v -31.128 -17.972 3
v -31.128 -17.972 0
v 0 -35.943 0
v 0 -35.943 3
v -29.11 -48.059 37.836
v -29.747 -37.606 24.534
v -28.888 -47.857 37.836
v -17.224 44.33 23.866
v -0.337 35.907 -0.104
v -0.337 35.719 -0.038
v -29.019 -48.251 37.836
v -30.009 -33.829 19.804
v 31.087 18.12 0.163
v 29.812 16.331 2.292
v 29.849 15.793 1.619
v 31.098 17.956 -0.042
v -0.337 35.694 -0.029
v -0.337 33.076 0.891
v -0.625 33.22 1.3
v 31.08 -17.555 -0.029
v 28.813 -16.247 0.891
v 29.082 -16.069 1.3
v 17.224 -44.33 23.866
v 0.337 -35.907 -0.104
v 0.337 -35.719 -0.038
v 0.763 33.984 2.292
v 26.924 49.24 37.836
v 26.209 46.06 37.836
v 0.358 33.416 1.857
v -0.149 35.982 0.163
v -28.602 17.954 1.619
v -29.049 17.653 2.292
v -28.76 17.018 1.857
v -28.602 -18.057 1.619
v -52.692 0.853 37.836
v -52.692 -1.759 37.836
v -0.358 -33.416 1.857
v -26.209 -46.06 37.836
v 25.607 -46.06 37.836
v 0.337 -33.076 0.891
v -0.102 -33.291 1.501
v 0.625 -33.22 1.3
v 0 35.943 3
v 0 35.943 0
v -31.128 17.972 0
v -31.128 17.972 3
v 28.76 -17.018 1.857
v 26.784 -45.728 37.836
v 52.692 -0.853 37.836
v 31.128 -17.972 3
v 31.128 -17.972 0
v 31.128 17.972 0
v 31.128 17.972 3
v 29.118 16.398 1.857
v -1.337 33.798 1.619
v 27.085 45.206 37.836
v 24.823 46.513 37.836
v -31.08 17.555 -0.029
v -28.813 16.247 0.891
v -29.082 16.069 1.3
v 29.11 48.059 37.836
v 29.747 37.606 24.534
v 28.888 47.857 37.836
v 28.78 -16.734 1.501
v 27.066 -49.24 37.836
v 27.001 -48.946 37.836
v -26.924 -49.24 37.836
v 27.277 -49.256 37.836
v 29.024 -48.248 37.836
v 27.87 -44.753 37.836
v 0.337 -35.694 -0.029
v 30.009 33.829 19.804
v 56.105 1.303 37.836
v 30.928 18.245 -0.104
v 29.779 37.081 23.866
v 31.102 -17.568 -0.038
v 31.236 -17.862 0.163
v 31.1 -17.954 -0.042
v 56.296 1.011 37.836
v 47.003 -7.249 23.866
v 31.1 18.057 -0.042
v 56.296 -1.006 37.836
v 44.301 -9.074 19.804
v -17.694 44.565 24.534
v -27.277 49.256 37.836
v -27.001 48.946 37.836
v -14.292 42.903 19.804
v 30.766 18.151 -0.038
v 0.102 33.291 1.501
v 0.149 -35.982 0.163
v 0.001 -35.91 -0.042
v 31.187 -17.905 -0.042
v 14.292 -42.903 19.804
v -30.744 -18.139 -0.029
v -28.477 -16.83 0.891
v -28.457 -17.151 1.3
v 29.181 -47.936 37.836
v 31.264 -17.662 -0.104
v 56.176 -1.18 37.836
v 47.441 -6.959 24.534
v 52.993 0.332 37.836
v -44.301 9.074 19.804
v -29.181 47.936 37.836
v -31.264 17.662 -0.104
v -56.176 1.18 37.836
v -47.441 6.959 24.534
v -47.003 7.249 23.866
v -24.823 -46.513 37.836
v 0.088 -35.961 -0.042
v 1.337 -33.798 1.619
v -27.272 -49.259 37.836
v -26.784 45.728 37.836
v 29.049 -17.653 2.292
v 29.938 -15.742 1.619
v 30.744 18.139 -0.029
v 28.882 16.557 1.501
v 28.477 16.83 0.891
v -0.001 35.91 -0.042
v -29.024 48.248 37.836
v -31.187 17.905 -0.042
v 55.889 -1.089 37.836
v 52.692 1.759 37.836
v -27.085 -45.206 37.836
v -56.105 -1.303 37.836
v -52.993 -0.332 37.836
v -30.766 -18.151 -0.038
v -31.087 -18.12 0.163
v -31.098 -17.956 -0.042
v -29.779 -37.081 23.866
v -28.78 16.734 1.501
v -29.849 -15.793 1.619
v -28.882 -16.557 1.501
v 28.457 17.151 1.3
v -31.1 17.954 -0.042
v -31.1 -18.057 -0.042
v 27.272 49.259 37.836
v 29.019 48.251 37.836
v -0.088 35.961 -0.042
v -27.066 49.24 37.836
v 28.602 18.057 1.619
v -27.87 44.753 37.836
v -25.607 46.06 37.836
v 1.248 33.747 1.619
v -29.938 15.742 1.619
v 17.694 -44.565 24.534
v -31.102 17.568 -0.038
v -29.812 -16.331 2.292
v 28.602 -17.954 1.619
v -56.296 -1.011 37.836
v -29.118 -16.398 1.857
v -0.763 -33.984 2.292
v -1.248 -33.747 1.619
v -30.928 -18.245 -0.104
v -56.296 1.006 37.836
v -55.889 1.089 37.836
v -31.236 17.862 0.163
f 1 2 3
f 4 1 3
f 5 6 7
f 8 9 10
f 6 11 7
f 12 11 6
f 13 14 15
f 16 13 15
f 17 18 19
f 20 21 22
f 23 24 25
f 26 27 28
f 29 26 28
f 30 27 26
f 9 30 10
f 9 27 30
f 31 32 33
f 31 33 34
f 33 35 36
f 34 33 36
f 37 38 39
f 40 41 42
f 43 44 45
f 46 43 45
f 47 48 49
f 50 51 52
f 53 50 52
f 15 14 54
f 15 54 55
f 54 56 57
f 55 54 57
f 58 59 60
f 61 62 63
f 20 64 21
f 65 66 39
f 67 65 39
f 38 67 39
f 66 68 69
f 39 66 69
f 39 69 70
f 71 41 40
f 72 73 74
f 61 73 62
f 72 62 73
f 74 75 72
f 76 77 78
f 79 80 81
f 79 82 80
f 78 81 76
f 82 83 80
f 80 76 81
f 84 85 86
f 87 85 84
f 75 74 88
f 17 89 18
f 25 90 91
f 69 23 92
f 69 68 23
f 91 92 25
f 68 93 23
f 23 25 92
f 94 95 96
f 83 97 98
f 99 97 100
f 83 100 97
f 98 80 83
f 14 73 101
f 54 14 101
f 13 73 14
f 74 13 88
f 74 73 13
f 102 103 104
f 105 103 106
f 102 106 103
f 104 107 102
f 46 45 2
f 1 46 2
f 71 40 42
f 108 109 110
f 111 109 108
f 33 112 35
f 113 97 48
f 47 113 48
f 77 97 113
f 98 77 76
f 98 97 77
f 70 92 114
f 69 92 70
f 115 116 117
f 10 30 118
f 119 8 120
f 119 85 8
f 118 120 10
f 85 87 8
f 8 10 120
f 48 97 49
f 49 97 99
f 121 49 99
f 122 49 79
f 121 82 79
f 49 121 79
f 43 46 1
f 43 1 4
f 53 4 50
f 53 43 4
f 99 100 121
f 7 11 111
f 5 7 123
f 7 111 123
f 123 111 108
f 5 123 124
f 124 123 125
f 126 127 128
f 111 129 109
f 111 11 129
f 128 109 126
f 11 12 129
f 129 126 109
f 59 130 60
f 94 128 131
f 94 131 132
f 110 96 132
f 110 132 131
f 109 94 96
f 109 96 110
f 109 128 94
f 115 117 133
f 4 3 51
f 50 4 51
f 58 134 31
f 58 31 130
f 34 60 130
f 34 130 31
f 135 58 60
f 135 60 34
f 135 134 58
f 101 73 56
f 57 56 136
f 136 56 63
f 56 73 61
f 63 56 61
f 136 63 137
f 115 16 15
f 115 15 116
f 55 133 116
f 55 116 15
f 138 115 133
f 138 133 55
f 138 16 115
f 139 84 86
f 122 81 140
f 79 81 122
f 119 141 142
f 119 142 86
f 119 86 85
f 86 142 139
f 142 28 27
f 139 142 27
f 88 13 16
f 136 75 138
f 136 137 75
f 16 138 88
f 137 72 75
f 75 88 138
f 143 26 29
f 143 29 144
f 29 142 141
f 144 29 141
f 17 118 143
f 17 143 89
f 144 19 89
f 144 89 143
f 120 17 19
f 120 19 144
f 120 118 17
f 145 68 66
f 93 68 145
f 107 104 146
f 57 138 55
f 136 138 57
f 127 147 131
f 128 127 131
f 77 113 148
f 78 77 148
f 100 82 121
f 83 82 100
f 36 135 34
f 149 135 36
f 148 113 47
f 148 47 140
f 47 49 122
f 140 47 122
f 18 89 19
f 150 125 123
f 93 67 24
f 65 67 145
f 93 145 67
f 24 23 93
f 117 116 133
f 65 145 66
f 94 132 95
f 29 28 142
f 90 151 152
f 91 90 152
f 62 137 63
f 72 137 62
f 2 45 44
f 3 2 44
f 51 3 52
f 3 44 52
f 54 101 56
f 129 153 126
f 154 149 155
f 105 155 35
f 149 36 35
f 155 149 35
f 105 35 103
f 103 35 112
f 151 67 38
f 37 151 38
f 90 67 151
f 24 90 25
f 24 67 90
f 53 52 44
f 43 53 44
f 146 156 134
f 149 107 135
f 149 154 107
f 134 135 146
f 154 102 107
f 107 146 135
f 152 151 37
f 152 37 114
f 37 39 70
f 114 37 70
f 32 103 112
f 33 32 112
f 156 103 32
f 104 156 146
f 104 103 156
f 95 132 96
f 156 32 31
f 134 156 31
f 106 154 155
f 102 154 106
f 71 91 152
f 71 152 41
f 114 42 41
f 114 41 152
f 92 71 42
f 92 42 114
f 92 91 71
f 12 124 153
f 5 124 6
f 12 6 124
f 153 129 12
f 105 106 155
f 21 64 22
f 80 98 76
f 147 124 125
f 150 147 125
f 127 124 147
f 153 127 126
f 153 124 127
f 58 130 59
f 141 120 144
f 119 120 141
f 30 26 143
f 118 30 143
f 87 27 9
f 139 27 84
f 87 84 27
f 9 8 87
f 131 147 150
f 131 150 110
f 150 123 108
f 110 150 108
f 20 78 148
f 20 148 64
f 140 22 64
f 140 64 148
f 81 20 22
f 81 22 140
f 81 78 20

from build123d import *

# Parameters (mm, degrees)
F6_DEPTH  = 3
F9_DEPTH  = 3
F10_COUNT = 6
F11_DEPTH = 3
F12_W     = 117.9919689894
F12_H     = 11.6260461509
F13_DEPTH = 60


with BuildPart() as f6:
    # F5 (on 3pt) → F6 (new body)
    with BuildSketch(Plane(origin=(21.5794067589, 0, -14.3542840713), x_dir=(0, 1, 0), z_dir=(0.8326194817, 0, -0.5538454647))):
        Polygon((18.0565174669, 17.1892922372), (0, 65.3814077377), (-17.9537590593, 17.1892922372), align=None)
    extrude(amount=-F6_DEPTH)

    # F8 (on 3pt) → F9 (join)
    with BuildSketch(Plane(origin=(27.7060275662, -15.9960824735, -11.2427532294), x_dir=(0.4371029691, 0.8817485961, -0.1773708196), z_dir=(0.8170423732, -0.4717196341, -0.3315453923))):
        Polygon((18.2439256459, 59.6142485738), (-38.4245254099, 48.2348278165), (-1.8889650237, 11.6593157873), align=None)
    extrude(amount=-F9_DEPTH)


with BuildPart() as f10_1:
    # F10: instance of F6
    add(f6.part.rotate(Axis((0, 0, 21.5341579169), (0, 0, 1)), 1 * 360 / F10_COUNT))


with BuildPart() as f10_2:
    # F10: instance of F6
    add(f6.part.rotate(Axis((0, 0, 21.5341579169), (0, 0, 1)), 2 * 360 / F10_COUNT))


with BuildPart() as f10_3:
    # F10: instance of F6
    add(f6.part.rotate(Axis((0, 0, 21.5341579169), (0, 0, 1)), 3 * 360 / F10_COUNT))


with BuildPart() as f10_4:
    # F10: instance of F6
    add(f6.part.rotate(Axis((0, 0, 21.5341579169), (0, 0, 1)), 4 * 360 / F10_COUNT))


with BuildPart() as f10_5:
    # F10: instance of F6
    add(f6.part.rotate(Axis((0, 0, 21.5341579169), (0, 0, 1)), 5 * 360 / F10_COUNT))


with BuildPart() as f11:
    # F2 (on Top) → F11 (new body)
    with BuildSketch(Plane.XY):
        Polygon((31.1276521534, -17.97155835), (31.1276521534, 17.97155835), (0, 35.9431167), (-31.1276521534, 17.97155835), (-31.1276521534, -17.97155835), (0, -35.9431167), align=None)
    extrude(amount=F11_DEPTH)


with BuildPart() as f13_tool:
    # F12 (on Right) → F13 (new body, symmetric)
    with BuildSketch(Plane.YZ):
        with Locations((-2.3104958236, 43.6490196735)):
            Rectangle(F12_W, F12_H)
    extrude(amount=F13_DEPTH, both=True)


with BuildPart() as f6_1:
    add(f6.part)

    # F13: cut by f13_tool
    add(f13_tool.part, mode=Mode.SUBTRACT)


with BuildPart() as f10_1_1:
    add(f10_1.part)

    # F13: cut by f13_tool
    add(f13_tool.part, mode=Mode.SUBTRACT)


with BuildPart() as f10_2_1:
    add(f10_2.part)

    # F13: cut by f13_tool
    add(f13_tool.part, mode=Mode.SUBTRACT)


with BuildPart() as f10_3_1:
    add(f10_3.part)

    # F13: cut by f13_tool
    add(f13_tool.part, mode=Mode.SUBTRACT)


with BuildPart() as f10_4_1:
    add(f10_4.part)

    # F13: cut by f13_tool
    add(f13_tool.part, mode=Mode.SUBTRACT)


with BuildPart() as f10_5_1:
    add(f10_5.part)

    # F13: cut by f13_tool
    add(f13_tool.part, mode=Mode.SUBTRACT)


solid = Compound([f11.part, f6_1.part, f10_1_1.part, f10_2_1.part, f10_3_1.part, f10_4_1.part, f10_5_1.part])
